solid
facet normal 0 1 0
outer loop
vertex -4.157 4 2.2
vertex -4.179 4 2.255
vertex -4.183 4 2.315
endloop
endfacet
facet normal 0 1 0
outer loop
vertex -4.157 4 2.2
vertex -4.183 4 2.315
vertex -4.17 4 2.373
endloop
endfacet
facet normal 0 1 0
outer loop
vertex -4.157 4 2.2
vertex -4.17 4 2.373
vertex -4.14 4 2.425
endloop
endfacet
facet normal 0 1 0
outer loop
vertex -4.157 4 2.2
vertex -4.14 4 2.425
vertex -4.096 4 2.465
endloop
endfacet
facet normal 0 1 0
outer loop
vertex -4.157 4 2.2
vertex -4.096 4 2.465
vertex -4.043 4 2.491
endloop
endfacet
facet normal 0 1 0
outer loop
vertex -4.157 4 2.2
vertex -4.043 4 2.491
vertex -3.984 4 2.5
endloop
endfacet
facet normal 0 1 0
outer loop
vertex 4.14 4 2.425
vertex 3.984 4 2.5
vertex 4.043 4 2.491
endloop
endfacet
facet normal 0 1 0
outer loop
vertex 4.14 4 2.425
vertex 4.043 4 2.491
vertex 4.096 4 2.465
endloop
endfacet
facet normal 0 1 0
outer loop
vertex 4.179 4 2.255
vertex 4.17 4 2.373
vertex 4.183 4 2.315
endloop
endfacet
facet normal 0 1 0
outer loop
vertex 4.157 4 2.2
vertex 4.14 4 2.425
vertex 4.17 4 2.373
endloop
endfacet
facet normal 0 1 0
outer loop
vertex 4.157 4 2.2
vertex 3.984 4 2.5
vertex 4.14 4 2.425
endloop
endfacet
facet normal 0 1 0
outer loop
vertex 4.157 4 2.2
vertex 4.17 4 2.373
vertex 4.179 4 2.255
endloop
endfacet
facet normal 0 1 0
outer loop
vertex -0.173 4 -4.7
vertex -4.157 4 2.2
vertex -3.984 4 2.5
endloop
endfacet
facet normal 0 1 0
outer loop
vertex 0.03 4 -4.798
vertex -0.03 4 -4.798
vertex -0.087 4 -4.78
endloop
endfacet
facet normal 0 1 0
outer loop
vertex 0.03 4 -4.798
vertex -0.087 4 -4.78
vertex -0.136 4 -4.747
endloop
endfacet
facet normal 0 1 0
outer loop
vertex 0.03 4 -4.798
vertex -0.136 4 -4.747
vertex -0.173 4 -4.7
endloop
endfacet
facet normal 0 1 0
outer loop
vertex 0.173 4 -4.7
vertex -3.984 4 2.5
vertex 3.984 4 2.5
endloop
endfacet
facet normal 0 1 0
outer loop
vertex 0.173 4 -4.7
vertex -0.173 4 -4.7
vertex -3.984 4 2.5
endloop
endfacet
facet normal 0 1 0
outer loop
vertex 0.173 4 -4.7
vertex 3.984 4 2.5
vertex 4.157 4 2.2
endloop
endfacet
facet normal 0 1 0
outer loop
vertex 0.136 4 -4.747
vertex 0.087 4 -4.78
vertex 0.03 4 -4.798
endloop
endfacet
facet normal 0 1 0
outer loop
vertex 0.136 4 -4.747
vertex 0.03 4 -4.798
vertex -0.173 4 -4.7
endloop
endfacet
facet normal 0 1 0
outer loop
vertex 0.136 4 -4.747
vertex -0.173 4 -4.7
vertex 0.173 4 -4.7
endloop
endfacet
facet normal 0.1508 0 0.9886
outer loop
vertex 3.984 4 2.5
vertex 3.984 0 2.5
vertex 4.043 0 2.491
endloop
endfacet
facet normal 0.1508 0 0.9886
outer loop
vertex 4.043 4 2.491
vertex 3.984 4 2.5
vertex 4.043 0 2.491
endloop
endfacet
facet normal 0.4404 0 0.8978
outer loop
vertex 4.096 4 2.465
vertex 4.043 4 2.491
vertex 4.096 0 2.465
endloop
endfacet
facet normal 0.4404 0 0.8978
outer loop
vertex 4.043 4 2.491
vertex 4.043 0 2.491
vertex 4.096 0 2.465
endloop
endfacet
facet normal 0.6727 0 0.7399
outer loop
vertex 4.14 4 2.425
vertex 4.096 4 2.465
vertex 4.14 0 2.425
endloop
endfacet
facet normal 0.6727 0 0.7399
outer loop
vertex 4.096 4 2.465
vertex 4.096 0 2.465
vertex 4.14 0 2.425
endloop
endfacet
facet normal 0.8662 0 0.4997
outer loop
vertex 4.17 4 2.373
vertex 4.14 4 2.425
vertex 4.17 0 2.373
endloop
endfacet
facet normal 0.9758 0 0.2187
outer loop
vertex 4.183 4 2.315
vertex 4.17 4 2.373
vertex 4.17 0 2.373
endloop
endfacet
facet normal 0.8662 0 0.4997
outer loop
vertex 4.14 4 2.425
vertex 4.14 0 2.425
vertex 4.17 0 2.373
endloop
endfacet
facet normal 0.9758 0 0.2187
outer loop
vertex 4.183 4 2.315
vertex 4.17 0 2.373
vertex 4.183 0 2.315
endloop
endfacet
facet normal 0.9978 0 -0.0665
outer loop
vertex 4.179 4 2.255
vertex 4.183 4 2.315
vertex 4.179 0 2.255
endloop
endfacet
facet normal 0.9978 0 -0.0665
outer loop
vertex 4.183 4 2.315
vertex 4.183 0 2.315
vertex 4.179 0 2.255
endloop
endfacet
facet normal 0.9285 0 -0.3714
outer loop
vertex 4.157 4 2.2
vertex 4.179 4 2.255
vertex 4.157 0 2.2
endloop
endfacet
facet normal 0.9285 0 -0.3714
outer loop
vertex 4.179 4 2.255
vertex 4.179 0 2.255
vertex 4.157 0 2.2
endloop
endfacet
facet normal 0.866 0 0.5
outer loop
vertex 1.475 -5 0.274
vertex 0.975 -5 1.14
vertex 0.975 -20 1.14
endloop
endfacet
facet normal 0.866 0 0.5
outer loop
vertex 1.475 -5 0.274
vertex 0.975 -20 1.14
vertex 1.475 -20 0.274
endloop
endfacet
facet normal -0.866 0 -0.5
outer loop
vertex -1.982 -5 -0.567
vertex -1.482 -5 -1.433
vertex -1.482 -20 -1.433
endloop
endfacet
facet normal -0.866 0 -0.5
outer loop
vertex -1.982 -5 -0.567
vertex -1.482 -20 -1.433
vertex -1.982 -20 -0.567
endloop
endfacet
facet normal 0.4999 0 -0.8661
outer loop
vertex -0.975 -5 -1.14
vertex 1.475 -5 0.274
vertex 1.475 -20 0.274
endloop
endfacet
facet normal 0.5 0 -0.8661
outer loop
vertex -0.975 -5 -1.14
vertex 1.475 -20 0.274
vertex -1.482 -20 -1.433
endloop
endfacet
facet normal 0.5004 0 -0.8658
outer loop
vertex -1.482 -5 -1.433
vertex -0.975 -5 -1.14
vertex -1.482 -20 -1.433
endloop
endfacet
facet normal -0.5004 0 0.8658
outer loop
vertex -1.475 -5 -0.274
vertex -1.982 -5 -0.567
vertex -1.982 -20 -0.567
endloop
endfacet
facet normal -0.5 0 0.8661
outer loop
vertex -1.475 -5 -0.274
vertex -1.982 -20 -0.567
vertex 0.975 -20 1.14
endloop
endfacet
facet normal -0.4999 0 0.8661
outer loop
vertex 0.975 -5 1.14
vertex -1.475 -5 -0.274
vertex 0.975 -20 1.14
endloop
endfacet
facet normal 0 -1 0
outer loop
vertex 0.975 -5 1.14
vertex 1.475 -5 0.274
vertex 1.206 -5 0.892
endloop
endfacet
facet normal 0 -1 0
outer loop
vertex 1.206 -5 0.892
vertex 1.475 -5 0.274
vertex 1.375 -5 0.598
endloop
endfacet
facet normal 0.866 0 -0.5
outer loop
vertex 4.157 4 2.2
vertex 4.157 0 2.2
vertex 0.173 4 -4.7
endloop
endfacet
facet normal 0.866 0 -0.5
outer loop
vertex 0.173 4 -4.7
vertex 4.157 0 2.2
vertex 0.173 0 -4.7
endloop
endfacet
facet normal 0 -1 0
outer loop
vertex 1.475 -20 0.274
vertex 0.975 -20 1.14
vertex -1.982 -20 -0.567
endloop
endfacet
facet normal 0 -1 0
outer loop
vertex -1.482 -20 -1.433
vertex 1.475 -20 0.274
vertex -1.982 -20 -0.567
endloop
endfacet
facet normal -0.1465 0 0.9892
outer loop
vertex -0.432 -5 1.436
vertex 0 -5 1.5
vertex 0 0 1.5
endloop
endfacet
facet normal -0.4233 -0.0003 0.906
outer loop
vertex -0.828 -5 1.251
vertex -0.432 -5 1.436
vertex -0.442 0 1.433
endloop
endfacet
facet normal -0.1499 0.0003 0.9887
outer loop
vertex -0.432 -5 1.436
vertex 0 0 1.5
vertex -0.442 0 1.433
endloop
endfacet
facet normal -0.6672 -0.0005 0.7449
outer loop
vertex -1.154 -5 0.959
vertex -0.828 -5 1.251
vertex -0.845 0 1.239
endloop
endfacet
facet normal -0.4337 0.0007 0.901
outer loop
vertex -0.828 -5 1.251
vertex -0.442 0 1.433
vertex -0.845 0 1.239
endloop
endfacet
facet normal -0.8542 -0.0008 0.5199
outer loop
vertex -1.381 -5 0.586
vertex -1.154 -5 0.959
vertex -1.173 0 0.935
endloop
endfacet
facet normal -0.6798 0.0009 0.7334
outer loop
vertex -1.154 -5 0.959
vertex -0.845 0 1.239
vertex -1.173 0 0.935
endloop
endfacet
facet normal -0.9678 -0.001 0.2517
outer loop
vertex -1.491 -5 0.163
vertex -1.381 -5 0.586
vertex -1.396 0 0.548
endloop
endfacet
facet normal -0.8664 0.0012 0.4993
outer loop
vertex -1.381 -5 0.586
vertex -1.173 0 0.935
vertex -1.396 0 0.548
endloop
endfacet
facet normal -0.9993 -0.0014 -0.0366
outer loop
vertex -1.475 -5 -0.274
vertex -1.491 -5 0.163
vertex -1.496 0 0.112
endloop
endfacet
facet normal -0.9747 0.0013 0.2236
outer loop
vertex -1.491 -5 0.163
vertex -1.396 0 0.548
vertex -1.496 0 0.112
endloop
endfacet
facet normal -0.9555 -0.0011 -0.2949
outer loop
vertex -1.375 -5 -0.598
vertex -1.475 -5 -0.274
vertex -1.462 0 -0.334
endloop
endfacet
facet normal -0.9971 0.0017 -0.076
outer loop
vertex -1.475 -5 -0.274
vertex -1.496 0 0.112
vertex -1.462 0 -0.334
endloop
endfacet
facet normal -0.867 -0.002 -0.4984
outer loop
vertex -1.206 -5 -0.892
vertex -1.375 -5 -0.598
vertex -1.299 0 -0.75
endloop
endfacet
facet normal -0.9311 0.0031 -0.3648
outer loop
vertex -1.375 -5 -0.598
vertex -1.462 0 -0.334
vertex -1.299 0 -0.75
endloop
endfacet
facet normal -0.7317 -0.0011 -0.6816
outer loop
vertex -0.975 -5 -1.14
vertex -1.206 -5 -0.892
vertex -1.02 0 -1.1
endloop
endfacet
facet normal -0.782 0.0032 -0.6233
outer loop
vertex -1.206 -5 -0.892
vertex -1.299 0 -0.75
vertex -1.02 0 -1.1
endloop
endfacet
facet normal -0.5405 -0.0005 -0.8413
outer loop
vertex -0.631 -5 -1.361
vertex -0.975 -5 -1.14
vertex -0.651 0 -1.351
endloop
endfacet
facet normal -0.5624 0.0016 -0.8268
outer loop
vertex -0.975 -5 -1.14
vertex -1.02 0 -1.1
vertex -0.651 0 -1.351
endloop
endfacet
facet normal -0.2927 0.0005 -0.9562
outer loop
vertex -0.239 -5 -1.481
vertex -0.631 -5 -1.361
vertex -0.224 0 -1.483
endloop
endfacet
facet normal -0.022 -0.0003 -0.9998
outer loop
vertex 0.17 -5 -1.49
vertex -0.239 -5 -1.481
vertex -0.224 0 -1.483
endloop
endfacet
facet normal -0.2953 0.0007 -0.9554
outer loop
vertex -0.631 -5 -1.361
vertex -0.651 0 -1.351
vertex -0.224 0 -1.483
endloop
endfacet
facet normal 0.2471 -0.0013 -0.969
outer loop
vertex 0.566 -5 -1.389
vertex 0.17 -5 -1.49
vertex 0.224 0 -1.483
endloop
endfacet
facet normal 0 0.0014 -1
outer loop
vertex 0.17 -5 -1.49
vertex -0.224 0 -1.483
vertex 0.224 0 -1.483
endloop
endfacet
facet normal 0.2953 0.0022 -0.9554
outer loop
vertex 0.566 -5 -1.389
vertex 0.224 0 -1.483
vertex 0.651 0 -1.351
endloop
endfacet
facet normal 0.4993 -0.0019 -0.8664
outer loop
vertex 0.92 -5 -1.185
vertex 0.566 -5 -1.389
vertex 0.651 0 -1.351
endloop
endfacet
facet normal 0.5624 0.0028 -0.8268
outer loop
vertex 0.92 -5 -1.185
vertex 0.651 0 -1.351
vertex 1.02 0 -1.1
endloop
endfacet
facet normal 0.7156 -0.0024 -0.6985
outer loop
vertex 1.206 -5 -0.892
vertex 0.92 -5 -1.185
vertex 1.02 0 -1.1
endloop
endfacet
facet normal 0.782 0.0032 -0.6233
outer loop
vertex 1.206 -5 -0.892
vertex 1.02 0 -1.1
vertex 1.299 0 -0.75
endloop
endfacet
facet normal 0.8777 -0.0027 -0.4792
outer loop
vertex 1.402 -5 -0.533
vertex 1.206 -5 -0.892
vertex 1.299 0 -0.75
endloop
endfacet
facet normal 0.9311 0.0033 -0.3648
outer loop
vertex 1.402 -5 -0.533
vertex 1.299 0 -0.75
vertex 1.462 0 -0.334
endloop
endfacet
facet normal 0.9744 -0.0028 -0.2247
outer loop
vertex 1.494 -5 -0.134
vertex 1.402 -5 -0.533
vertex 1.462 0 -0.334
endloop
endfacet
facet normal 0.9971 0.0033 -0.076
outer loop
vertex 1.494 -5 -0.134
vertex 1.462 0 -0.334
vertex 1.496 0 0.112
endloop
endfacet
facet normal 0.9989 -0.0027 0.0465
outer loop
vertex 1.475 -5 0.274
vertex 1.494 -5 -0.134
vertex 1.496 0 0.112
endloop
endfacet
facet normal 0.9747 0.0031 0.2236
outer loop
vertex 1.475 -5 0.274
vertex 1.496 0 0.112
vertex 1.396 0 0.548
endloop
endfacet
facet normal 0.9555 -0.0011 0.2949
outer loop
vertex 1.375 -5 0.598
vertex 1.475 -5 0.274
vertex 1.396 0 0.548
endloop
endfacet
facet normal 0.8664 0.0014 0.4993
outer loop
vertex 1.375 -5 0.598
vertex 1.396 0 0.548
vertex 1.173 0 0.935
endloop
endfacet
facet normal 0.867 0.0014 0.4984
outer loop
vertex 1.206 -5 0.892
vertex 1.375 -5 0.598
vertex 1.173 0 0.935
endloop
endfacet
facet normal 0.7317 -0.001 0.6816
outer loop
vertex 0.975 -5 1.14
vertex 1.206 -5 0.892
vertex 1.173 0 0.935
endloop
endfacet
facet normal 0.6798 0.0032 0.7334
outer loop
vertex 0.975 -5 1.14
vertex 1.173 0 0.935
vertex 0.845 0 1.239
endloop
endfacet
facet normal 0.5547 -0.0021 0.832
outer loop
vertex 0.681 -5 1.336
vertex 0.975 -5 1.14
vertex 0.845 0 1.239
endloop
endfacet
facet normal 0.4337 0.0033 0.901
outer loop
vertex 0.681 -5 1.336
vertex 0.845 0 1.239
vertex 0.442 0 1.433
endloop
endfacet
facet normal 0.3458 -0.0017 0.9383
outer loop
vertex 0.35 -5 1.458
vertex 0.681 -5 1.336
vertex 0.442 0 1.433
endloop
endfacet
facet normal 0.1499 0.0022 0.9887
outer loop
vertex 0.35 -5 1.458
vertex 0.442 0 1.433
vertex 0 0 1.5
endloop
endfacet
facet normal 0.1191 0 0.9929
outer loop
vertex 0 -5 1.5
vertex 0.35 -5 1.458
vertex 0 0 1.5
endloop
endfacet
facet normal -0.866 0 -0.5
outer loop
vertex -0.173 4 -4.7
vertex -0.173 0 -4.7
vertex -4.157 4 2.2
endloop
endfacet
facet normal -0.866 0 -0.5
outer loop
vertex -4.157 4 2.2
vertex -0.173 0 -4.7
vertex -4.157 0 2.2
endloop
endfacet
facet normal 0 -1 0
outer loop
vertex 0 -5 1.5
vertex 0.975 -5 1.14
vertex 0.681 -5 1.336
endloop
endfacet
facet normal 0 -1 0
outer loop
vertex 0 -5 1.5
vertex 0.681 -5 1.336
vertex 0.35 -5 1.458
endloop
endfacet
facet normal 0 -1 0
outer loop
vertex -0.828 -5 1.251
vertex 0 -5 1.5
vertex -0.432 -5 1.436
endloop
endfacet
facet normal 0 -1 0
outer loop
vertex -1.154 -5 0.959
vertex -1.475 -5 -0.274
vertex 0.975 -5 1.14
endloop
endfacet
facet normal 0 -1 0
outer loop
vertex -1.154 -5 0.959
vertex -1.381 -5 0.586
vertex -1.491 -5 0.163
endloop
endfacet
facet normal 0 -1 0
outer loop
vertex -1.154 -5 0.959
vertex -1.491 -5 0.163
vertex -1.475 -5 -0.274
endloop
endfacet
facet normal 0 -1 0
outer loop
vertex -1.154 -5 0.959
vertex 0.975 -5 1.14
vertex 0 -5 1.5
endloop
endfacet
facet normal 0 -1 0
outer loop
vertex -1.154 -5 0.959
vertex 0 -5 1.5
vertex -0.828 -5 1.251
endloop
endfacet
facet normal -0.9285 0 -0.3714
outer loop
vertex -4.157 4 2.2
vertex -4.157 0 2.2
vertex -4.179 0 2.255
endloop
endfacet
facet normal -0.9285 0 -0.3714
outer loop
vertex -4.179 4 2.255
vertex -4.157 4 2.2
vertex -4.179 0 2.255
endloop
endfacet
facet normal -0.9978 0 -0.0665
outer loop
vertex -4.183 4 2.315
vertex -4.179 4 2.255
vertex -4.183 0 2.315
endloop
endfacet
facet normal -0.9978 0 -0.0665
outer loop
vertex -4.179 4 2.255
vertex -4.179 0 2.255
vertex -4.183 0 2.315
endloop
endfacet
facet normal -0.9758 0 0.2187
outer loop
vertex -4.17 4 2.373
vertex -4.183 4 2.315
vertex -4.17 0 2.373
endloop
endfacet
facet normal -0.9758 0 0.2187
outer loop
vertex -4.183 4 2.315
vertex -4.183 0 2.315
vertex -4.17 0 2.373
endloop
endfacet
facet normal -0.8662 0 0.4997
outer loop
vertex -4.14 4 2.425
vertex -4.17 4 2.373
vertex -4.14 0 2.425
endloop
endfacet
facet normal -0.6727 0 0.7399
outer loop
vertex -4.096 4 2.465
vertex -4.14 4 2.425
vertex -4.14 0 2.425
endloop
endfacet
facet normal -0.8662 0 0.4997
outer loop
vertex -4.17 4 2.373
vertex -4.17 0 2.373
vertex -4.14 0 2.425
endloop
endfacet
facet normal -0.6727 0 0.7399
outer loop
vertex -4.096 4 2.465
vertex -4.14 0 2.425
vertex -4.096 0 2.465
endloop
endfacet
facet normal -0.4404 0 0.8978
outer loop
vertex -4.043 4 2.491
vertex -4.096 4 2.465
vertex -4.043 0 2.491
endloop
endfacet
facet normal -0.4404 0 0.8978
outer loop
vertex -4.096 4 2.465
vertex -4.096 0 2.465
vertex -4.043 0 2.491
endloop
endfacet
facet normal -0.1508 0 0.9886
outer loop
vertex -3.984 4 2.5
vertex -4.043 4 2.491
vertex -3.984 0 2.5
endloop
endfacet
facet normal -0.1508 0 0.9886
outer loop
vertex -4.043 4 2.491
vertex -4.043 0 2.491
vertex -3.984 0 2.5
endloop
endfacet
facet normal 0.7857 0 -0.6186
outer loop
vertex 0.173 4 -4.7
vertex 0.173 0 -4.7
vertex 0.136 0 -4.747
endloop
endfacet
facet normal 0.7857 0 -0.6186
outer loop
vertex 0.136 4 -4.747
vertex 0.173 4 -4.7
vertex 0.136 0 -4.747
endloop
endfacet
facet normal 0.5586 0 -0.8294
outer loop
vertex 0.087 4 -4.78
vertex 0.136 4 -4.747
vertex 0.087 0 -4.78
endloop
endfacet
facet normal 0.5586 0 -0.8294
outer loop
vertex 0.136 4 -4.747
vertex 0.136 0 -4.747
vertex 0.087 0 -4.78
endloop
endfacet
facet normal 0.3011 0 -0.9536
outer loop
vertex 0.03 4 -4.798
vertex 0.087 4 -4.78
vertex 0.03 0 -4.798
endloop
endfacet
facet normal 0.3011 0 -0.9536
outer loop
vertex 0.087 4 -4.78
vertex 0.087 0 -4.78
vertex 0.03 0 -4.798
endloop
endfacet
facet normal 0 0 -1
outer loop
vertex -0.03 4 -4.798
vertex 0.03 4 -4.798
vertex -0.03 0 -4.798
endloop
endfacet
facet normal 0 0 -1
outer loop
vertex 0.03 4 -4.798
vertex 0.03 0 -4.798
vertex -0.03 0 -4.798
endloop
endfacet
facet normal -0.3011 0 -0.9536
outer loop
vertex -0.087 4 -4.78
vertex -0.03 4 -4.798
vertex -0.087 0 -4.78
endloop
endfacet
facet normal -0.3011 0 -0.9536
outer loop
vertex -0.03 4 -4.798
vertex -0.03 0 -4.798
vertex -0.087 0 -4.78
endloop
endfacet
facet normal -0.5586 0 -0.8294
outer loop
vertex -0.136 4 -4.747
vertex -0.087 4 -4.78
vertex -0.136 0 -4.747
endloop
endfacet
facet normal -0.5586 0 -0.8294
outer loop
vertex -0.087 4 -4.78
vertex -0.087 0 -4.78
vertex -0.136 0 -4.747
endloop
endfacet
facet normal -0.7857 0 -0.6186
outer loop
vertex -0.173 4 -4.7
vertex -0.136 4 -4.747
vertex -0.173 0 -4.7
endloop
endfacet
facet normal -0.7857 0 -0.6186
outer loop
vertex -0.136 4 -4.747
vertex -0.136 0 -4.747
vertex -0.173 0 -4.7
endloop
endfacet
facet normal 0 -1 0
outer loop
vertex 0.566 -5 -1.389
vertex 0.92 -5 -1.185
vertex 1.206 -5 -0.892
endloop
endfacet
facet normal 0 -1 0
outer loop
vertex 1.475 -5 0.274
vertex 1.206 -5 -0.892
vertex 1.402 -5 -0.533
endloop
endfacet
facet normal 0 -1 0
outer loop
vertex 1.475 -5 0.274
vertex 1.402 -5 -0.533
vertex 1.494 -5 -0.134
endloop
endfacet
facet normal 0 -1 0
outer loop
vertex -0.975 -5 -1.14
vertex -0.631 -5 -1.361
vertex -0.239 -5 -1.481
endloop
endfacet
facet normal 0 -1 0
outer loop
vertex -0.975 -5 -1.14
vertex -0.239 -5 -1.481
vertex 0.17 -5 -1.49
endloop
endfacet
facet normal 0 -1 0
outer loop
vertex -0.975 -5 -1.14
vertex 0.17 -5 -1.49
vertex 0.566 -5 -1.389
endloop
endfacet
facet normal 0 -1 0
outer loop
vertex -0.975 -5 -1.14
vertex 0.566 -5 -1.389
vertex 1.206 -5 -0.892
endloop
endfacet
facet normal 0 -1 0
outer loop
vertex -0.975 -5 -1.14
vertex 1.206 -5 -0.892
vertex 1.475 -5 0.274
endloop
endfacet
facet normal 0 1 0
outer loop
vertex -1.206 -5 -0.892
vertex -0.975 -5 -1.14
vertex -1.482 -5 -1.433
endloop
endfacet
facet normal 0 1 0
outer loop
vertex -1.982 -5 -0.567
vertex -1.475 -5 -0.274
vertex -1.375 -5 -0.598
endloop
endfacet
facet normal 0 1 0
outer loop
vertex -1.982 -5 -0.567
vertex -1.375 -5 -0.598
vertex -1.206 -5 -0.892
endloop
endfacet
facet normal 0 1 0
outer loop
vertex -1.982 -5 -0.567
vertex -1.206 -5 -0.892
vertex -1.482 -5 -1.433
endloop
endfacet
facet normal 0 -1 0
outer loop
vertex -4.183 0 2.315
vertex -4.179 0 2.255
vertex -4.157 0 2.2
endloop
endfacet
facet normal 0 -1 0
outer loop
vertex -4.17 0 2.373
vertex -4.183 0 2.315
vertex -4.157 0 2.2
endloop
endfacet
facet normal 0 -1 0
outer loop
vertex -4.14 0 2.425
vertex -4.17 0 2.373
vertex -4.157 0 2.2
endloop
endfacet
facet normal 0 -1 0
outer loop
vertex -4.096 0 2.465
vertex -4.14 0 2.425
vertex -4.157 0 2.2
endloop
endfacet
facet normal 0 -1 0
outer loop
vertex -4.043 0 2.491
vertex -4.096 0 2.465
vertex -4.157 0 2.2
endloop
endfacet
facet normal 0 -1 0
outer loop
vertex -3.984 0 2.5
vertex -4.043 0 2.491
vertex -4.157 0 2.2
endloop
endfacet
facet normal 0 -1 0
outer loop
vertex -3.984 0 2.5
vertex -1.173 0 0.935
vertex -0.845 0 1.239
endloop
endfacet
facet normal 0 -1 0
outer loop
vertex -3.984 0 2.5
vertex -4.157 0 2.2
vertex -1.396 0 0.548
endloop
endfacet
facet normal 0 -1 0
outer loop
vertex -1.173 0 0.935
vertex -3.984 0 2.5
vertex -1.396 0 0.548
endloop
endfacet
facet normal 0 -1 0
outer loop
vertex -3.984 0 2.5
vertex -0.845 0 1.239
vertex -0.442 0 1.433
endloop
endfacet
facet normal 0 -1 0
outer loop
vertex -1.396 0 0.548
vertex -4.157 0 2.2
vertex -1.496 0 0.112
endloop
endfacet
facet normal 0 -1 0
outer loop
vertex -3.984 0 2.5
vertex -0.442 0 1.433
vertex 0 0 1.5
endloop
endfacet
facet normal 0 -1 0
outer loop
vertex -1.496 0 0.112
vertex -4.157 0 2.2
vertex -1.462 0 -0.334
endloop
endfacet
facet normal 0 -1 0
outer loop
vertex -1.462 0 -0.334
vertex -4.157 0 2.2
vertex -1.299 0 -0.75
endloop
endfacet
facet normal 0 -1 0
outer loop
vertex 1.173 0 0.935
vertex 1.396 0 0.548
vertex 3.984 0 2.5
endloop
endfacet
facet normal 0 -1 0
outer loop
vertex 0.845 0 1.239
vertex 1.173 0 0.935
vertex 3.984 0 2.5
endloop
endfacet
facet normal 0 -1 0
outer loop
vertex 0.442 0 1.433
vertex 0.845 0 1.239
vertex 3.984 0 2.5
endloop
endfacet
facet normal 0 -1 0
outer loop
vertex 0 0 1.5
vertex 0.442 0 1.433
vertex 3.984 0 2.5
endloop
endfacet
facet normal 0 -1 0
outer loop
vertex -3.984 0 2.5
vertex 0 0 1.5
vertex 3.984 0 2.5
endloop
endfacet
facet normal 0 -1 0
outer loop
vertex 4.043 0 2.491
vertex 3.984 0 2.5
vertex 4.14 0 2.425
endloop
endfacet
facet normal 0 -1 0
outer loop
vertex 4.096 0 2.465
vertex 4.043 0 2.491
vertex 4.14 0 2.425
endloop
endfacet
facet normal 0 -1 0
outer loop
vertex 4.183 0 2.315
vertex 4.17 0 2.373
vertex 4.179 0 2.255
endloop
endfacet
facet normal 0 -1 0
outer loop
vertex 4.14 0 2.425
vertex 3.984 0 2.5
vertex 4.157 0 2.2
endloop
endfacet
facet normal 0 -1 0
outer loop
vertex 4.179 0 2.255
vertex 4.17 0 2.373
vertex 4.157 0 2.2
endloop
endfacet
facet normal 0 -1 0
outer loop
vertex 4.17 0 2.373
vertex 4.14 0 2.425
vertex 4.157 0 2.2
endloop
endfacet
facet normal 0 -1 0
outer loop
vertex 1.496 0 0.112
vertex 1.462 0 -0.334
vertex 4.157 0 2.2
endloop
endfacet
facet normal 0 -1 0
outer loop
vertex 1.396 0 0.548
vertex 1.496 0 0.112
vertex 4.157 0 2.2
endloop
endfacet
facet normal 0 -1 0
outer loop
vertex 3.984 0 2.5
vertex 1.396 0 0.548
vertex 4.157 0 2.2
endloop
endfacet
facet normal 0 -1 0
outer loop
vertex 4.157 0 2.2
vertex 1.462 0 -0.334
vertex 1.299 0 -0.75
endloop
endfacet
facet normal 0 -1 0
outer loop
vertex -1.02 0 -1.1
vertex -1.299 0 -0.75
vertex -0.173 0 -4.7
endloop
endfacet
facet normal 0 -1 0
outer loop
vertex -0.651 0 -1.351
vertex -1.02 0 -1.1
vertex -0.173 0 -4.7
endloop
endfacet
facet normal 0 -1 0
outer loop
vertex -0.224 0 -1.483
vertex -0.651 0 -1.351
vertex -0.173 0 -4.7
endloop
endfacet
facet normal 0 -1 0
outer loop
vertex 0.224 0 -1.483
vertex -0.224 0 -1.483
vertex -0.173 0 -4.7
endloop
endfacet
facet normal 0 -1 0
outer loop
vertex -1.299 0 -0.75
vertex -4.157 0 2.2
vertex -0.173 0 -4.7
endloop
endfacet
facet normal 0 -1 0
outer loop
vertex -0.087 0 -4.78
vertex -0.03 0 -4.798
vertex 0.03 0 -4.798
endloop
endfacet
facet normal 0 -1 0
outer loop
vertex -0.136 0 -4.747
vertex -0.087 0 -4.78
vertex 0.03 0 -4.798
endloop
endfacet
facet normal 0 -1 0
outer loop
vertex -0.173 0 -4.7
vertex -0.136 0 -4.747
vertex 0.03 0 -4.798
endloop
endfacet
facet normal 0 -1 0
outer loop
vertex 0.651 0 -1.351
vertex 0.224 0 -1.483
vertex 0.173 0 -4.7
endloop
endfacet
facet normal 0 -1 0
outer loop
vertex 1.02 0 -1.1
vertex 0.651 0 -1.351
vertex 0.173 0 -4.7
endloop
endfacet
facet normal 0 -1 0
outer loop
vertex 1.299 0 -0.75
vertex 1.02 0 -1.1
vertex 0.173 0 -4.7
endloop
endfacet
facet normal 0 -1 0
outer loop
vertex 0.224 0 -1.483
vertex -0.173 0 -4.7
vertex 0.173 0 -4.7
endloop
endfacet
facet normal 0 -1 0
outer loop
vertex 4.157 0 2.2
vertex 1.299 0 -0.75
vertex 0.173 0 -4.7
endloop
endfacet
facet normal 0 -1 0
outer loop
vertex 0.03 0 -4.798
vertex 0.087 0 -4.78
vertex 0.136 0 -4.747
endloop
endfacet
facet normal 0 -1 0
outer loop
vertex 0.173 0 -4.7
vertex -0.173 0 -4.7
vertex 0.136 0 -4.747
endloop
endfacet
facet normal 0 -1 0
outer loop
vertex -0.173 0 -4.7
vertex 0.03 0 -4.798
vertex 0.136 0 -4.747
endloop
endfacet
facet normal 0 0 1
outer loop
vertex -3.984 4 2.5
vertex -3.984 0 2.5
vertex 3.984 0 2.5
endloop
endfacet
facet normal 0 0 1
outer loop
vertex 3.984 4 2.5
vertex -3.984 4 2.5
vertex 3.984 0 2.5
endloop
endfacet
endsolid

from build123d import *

# Parameters (mm, degrees)
EXTRUDE_1_DEPTH = 4
SKETCH_2_R      = 1.5
EXTRUDE_2_DEPTH = 5
EXTRUDE_3_DEPTH = 15


with BuildPart() as part:
    # 草图1 → 凸台-拉伸1 (new body)
    with BuildSketch(Plane(origin=(0, 0, 0), x_dir=(1, 0, 0), z_dir=(0, 1, 0))):
        with BuildLine():
            Line((-0.173205081, 4.7), (-4.156921938, -2.2))
            ThreePointArc((-4.156921938, -2.2), (-4.156921938, -2.4), (-3.983716857, -2.5))
            Line((-3.983716857, -2.5), (3.983716857, -2.5))
            ThreePointArc((3.983716857, -2.5), (4.156921938, -2.4), (4.156921938, -2.2))
            Line((4.156921938, -2.2), (0.173205081, 4.7))
            ThreePointArc((0.173205081, 4.7), (0, 4.8), (-0.173205081, 4.7))
        make_face()
    extrude(amount=EXTRUDE_1_DEPTH)

    # 草图2 → 凸台-拉伸2 (add)
    with BuildSketch(Plane.XZ):
        with Locations(Location((0, 0, 0), (0, 0, 90))):
            Circle(SKETCH_2_R)
    extrude(amount=EXTRUDE_2_DEPTH)

    # 草图3 → 凸台-拉伸3 (add)
    with BuildSketch(Plane.XZ.offset(5)):
        Polygon((-1.982050808, -0.566987298), (0.974744871, 1.140119483), (1.474744871, 0.274094079), (-1.482050808, -1.433012702), align=None)
    extrude(amount=EXTRUDE_3_DEPTH)


solid = part.part
